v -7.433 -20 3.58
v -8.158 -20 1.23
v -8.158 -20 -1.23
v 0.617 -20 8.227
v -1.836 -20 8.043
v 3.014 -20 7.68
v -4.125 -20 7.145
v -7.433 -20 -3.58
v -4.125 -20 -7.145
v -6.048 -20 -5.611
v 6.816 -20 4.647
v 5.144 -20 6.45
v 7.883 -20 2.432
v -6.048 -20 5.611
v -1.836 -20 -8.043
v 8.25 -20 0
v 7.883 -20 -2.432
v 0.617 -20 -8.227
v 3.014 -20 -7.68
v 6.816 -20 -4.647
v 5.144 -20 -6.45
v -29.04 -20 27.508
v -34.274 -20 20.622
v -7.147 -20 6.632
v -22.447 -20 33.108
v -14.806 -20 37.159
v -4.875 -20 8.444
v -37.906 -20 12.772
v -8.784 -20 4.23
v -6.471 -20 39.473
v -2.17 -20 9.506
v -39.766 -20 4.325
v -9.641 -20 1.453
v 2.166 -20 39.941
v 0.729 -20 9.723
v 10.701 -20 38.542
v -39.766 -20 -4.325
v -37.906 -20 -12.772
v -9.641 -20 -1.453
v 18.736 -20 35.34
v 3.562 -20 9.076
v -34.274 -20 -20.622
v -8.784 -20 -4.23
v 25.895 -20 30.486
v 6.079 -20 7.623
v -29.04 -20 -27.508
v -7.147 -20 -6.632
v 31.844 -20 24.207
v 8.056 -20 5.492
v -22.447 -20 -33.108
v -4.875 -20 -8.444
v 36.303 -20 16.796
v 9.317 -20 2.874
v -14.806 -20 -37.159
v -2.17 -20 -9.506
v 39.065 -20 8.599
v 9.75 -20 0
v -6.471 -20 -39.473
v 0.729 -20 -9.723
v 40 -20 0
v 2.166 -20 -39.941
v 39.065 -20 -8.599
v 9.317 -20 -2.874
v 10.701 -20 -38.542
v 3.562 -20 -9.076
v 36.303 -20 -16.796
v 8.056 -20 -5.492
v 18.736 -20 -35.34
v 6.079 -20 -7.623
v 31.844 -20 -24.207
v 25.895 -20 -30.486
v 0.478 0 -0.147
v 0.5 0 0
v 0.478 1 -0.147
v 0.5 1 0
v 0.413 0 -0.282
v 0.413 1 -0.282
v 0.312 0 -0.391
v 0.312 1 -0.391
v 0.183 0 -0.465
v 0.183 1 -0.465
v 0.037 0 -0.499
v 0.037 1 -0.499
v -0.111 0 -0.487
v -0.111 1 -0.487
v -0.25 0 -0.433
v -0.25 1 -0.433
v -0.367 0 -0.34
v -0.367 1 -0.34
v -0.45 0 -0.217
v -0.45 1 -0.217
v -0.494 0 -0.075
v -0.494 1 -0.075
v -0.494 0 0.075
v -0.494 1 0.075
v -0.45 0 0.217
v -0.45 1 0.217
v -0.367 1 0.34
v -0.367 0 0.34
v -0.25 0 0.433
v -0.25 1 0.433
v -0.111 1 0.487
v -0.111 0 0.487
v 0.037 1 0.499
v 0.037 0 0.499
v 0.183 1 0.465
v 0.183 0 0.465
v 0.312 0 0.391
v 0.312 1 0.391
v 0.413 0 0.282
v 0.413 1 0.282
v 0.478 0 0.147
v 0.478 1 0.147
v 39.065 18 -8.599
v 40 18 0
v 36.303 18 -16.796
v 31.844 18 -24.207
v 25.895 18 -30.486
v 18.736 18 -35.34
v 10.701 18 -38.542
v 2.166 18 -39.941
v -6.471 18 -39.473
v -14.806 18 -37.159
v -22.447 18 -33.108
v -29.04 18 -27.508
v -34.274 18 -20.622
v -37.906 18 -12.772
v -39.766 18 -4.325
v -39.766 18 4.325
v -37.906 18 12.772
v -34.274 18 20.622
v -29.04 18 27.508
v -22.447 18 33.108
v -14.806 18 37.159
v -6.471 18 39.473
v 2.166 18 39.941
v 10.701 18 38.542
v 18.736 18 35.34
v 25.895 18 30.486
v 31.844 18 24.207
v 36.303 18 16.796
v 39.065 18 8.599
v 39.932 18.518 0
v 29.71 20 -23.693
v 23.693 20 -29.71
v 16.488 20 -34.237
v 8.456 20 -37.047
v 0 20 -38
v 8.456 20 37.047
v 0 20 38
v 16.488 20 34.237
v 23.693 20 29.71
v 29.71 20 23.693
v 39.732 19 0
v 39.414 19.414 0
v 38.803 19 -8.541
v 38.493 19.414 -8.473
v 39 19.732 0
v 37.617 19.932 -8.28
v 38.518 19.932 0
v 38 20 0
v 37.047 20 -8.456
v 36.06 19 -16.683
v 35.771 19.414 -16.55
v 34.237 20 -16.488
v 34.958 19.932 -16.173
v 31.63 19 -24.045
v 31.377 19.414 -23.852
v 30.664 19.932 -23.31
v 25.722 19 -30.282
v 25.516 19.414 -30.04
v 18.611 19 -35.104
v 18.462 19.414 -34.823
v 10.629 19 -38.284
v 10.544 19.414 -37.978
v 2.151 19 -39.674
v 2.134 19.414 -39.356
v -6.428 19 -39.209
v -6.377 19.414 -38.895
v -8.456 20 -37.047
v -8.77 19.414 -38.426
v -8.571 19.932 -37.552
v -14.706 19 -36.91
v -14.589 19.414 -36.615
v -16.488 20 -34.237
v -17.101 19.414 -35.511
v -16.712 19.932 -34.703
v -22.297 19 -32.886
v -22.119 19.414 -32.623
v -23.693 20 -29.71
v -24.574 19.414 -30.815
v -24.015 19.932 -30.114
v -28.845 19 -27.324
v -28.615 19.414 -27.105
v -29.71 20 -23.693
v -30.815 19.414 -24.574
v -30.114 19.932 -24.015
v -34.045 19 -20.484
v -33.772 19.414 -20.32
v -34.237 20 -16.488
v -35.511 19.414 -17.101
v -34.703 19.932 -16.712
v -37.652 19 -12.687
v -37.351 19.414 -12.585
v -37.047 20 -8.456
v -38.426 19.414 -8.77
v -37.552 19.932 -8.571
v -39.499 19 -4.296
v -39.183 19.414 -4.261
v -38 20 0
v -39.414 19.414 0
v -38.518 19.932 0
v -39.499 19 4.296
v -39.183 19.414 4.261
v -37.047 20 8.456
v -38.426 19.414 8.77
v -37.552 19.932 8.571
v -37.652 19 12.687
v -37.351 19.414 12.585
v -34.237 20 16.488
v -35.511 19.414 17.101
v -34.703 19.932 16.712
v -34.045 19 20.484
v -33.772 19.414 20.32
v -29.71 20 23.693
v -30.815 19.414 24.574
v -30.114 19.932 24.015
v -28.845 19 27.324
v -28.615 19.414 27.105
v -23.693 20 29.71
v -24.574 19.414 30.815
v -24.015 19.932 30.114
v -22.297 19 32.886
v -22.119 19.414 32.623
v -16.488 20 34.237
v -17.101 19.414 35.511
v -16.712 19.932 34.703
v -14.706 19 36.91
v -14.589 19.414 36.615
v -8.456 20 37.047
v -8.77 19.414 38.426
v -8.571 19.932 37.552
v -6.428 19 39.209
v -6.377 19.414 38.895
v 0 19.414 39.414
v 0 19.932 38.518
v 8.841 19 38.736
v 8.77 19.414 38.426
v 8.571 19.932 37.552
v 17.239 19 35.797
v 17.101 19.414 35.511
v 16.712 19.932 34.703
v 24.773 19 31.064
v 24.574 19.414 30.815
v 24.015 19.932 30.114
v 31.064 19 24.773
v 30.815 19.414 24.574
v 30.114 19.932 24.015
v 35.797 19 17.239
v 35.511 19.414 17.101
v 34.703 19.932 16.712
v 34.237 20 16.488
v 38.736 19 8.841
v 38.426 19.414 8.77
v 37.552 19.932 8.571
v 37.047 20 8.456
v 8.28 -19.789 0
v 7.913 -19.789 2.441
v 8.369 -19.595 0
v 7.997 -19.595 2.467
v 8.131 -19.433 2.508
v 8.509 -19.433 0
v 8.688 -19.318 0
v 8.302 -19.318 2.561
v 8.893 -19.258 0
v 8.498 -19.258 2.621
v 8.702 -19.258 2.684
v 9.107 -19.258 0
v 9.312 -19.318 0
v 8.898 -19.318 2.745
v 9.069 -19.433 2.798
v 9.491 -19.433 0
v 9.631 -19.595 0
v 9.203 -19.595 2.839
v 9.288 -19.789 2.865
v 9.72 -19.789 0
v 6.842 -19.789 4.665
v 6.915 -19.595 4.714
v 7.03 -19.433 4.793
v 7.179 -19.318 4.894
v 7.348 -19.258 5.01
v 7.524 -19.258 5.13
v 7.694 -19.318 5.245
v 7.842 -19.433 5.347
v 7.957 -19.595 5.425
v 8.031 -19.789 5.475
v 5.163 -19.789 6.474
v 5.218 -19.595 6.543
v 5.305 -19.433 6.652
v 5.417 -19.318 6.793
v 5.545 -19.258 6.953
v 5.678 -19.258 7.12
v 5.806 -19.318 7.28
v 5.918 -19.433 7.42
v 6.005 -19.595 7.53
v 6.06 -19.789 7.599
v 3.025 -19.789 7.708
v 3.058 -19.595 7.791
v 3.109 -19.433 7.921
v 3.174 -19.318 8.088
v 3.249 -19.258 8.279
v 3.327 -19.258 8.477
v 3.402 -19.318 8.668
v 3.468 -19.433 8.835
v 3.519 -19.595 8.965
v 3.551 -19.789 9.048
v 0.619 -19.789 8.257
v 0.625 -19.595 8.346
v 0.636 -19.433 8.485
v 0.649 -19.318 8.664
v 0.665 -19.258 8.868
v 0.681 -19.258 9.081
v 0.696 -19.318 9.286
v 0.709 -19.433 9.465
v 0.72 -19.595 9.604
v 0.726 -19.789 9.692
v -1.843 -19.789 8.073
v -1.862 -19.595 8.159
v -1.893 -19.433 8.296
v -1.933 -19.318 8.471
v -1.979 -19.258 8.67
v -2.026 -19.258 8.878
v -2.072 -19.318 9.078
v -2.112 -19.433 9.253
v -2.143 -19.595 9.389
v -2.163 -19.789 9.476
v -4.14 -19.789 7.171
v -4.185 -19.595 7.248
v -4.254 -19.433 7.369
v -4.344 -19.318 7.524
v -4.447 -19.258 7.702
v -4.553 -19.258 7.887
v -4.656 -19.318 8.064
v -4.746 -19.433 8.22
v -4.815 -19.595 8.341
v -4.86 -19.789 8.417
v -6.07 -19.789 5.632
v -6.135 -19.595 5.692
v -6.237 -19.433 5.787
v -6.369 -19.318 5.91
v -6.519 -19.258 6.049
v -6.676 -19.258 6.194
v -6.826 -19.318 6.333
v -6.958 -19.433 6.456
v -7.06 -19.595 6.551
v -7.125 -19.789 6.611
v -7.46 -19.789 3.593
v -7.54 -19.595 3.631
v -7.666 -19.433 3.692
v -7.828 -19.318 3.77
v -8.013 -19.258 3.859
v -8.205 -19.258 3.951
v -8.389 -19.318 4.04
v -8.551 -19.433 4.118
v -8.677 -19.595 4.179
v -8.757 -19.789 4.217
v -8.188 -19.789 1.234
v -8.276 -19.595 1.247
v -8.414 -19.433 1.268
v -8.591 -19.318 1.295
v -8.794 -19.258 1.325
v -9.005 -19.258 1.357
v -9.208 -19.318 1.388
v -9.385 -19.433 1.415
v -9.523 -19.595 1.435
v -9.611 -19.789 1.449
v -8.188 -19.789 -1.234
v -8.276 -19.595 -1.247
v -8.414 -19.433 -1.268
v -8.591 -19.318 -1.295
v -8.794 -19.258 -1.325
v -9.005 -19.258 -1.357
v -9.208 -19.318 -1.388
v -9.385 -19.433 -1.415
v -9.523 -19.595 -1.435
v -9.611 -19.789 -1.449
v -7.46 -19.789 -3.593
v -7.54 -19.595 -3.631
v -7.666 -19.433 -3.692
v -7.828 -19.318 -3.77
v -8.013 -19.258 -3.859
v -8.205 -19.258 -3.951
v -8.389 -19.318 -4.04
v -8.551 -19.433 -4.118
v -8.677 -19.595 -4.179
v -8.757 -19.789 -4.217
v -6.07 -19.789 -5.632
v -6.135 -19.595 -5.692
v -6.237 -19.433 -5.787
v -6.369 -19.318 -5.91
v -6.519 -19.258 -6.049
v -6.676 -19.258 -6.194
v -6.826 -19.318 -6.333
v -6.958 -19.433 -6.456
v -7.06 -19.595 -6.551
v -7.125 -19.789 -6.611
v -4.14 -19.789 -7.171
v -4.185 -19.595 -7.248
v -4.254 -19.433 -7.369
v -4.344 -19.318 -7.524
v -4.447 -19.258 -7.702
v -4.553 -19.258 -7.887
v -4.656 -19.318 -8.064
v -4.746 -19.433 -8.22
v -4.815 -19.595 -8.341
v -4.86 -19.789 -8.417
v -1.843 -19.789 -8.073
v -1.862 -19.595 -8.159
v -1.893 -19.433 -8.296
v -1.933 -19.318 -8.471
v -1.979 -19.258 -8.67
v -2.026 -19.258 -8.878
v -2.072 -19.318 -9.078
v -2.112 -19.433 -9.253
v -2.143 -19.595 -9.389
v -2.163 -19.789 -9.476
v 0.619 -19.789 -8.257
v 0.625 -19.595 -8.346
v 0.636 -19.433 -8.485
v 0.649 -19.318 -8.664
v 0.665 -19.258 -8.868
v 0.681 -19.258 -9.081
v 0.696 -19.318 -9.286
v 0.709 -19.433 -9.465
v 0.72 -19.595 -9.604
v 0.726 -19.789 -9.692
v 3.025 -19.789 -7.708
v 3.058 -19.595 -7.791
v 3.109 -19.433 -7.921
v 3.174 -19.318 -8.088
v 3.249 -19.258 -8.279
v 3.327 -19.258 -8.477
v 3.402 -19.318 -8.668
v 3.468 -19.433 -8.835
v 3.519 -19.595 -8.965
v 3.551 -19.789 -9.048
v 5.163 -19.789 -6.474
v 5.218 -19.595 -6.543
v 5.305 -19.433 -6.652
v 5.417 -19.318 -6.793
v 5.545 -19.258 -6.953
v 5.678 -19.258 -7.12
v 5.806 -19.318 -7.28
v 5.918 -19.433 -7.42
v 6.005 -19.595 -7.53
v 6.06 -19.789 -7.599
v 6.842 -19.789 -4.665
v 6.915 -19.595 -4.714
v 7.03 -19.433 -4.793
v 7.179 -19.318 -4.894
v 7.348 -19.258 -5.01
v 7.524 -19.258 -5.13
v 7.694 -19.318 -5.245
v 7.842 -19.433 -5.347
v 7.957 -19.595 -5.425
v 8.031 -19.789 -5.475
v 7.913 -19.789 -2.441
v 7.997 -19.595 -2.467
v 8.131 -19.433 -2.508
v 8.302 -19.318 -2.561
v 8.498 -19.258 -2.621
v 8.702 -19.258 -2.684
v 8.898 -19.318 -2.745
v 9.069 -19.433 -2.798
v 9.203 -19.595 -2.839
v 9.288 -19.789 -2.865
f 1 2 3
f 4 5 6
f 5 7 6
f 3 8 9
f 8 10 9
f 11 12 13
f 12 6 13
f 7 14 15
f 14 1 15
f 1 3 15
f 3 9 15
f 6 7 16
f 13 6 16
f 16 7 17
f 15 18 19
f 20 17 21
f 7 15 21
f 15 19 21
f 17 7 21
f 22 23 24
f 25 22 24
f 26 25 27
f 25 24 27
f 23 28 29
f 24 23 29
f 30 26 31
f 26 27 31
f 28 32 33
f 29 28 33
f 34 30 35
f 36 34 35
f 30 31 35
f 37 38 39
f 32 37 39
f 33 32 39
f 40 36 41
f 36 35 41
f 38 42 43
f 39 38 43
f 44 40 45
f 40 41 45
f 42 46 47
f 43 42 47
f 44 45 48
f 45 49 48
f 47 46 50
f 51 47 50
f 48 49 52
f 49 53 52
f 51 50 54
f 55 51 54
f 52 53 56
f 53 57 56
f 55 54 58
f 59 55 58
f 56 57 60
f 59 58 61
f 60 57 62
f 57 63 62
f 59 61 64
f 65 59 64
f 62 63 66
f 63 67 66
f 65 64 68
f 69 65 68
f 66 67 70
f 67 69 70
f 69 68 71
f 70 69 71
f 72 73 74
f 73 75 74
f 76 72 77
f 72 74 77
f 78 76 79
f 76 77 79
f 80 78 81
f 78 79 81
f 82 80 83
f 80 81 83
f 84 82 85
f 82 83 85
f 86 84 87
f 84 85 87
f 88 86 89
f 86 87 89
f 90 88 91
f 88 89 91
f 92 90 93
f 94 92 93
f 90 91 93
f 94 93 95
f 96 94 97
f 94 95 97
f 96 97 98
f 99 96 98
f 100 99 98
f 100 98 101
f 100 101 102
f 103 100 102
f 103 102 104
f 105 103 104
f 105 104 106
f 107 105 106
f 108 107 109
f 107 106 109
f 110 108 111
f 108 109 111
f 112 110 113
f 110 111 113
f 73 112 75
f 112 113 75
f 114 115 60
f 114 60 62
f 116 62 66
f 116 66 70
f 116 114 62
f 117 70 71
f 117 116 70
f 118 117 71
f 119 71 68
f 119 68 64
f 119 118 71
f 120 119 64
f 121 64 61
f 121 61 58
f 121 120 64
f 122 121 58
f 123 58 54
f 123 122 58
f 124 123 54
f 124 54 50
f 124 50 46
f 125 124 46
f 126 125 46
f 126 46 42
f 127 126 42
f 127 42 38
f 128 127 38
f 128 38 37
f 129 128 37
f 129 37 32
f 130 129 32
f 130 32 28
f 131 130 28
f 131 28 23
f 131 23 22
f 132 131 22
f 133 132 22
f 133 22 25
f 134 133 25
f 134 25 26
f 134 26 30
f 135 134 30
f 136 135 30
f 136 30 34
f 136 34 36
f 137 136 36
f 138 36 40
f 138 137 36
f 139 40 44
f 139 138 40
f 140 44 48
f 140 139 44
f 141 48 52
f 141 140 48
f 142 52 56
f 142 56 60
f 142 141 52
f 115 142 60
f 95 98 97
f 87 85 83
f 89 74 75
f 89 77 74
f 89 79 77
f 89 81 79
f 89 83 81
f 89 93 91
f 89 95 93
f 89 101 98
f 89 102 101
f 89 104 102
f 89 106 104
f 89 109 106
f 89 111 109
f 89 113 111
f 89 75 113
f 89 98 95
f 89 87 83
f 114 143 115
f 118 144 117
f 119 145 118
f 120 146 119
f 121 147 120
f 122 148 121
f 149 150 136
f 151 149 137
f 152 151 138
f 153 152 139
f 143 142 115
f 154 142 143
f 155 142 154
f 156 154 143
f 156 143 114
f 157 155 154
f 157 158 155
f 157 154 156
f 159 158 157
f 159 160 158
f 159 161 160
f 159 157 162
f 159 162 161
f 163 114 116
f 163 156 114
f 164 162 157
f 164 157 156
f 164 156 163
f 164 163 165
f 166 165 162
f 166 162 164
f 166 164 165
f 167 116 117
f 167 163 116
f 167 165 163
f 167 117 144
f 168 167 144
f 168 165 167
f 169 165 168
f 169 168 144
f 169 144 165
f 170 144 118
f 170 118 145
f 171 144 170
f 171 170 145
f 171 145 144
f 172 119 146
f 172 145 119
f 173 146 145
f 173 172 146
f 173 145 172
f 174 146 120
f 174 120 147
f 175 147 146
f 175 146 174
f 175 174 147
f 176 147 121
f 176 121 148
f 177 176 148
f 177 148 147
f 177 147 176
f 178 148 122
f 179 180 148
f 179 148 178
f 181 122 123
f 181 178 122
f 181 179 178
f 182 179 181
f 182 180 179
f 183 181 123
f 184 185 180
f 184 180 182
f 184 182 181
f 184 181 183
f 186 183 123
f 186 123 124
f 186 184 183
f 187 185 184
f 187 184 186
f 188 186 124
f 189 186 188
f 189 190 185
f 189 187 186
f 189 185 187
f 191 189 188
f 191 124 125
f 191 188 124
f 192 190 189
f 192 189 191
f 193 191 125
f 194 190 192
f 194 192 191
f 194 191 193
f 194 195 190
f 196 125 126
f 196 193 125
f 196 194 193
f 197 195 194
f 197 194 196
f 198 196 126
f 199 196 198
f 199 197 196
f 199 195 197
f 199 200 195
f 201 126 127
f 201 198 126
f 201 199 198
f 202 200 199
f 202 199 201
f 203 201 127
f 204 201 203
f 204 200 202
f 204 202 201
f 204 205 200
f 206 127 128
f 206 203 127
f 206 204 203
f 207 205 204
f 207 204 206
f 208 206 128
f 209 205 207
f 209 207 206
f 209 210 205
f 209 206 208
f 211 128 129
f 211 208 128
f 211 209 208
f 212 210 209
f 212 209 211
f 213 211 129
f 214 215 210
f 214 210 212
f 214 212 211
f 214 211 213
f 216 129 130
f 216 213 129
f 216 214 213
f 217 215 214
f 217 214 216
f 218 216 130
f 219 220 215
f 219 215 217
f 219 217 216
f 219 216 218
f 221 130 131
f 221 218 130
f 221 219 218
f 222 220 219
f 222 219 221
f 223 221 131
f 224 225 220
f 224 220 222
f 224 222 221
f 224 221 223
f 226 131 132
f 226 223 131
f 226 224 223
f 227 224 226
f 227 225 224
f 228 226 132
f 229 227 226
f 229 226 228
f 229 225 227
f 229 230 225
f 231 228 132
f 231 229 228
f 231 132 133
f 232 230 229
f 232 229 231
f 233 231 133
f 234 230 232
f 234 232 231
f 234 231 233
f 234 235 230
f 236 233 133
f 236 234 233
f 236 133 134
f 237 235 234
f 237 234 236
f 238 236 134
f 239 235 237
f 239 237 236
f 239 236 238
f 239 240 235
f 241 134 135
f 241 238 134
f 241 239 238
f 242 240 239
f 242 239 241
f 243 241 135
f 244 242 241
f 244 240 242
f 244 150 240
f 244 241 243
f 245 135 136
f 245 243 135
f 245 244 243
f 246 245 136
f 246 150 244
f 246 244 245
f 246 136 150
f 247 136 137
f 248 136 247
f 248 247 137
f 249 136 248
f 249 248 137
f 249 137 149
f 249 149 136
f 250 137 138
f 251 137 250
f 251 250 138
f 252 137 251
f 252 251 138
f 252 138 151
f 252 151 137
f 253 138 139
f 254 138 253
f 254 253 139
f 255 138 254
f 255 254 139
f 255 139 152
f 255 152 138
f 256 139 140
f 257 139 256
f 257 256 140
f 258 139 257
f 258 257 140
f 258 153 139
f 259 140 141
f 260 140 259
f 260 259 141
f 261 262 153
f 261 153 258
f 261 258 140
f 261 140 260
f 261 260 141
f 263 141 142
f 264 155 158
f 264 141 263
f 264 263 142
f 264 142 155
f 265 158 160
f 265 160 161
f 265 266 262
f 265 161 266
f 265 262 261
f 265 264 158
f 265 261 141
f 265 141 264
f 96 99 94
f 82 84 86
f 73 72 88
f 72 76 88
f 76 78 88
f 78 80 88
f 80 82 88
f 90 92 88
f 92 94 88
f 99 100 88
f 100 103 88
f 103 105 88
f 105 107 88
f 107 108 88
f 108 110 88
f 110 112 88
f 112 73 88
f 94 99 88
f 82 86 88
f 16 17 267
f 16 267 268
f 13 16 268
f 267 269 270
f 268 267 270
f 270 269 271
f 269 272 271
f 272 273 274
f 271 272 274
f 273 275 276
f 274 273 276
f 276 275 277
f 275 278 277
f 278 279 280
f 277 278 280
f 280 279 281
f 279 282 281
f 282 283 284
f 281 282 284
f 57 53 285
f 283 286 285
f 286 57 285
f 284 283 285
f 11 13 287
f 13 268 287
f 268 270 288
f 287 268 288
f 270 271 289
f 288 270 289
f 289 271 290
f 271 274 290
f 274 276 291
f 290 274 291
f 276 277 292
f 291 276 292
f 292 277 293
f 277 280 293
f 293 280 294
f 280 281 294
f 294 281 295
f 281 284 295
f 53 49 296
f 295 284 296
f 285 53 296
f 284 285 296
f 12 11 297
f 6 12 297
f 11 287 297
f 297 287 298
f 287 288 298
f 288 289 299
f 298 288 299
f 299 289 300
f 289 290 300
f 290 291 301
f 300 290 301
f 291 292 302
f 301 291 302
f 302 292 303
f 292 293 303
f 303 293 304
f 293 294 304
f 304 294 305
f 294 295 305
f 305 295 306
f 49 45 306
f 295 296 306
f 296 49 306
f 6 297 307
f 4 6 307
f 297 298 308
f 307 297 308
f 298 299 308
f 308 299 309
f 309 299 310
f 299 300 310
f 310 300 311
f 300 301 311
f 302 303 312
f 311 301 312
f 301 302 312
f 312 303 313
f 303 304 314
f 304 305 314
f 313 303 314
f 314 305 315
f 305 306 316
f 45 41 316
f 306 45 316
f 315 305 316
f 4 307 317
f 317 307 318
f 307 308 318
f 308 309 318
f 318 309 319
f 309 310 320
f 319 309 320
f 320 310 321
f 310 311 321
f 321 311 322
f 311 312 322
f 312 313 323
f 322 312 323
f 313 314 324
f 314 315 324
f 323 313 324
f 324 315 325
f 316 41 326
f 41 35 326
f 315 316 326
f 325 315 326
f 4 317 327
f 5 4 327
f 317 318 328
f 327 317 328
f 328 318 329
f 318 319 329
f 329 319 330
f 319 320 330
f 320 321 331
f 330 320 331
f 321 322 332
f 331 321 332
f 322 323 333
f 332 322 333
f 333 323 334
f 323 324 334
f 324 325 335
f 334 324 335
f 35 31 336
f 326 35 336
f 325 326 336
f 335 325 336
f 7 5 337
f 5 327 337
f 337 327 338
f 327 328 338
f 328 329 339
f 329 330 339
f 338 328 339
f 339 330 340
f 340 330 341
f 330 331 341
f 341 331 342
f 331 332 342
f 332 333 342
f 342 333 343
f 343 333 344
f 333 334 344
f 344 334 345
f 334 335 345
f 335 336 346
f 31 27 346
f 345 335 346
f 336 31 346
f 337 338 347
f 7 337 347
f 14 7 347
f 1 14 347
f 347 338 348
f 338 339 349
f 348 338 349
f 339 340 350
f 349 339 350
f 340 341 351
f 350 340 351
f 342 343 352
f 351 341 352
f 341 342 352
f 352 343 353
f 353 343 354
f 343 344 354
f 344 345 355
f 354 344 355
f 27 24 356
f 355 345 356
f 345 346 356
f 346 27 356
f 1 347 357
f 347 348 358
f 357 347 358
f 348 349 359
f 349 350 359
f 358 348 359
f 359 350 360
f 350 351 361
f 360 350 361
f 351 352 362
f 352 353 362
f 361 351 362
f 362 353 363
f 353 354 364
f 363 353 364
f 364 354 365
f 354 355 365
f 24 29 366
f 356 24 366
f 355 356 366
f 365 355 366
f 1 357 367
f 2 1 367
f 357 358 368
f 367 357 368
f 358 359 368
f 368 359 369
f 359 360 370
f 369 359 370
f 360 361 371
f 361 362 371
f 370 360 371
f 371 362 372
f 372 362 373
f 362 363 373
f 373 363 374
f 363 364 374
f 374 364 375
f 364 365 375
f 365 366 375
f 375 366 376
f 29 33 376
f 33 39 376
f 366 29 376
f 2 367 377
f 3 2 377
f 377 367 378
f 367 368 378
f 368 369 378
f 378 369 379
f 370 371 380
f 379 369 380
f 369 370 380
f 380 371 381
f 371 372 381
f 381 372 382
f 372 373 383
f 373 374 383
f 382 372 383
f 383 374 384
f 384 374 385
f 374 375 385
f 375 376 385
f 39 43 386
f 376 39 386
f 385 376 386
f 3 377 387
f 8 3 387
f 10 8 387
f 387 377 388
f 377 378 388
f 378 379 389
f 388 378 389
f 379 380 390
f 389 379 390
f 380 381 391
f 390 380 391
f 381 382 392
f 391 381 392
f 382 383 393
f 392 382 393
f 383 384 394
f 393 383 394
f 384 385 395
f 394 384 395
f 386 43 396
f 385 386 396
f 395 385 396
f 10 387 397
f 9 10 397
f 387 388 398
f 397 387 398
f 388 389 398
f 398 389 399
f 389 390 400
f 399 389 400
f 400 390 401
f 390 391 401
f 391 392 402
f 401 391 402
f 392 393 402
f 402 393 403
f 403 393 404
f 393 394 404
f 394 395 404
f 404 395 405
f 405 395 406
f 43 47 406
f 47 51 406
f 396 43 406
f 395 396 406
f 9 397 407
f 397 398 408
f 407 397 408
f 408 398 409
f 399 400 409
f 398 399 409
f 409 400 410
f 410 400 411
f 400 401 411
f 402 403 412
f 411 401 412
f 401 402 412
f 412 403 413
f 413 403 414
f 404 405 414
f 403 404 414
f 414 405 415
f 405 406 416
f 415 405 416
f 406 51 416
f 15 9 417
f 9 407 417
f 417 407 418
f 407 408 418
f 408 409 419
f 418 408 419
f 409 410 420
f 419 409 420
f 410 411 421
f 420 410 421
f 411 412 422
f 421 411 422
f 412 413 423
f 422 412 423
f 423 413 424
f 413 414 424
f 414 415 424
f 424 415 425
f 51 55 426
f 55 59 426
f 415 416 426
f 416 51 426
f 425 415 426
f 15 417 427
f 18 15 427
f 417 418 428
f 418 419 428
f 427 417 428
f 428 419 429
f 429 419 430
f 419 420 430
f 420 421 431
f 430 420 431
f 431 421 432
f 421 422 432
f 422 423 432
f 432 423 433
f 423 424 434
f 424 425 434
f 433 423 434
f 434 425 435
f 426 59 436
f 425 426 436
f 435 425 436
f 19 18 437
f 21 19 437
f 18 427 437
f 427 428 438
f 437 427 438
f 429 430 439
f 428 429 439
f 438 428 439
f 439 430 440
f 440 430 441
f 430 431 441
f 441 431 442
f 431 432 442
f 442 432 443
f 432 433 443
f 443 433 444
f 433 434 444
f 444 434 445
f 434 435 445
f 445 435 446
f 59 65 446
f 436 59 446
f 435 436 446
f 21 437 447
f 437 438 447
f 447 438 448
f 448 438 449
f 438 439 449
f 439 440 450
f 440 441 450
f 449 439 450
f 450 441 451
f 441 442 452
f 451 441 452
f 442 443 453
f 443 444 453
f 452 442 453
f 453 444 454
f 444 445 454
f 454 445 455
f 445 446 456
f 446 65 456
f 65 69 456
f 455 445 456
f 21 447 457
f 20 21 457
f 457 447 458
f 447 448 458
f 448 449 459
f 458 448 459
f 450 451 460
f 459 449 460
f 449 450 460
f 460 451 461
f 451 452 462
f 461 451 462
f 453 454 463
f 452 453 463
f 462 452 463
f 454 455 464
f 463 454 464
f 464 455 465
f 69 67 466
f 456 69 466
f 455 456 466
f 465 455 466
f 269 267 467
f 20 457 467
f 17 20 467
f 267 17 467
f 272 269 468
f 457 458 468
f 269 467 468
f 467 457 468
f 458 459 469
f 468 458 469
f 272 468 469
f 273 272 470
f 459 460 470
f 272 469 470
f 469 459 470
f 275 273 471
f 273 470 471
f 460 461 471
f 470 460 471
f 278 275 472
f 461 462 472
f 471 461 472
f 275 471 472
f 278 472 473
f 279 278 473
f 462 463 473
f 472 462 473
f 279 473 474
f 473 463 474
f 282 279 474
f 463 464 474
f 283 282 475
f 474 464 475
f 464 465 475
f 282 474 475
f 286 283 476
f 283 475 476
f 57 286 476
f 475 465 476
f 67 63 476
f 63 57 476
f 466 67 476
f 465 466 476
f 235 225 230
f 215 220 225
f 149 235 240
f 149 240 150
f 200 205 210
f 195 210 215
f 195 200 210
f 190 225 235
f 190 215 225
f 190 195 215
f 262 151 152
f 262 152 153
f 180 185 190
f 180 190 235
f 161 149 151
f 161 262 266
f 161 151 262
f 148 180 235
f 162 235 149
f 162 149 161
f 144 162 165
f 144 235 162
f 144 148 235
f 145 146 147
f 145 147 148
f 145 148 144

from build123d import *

# Parameters (mm, degrees)
SKETCH_1_R        = 40
EXTRUDE_1_DEPTH   = 20
FILLET_1_R        = 2
SWEEP_3_PROFILE_R = 0.75
SKETCH_2_W        = 0.5
SKETCH_2_H        = 1


with BuildPart() as part:
    # 草图1 → 凸台-拉伸1 (new body, symmetric)
    with BuildSketch(Plane(origin=(0, 0, 0), x_dir=(1, 0, 0), z_dir=(0, 1, 0))):
        Circle(SKETCH_1_R)
    extrude(amount=EXTRUDE_1_DEPTH, both=True)

    # 圆角1
    fillet_1_edges = [part.edges().sort_by_distance(p)[0] for p in [
        (-40, 20, 0),
    ]]
    fillet(fillet_1_edges, radius=FILLET_1_R)

    # 切除-扫描3: sweep along a path in 草图3
    with BuildLine(Plane.XZ.offset(20)) as sweep_3_path:
        CenterArc((0, 0), 9, 0, 360)
    # 切除-扫描3 profile (on start of the path) → 切除-扫描3 (sweep, cut)
    with BuildSketch(Plane(origin=(9, -20, 0), x_dir=(1, 0, 0), z_dir=(0, 0, 1))):
        Circle(SWEEP_3_PROFILE_R)
    sweep(path=sweep_3_path.line, mode=Mode.SUBTRACT)

    # 草图2 → 切除-旋转1 (revolve, cut)
    with BuildSketch(Plane.XY):
        with Locations((0.25, 0.5)):
            Rectangle(SKETCH_2_W, SKETCH_2_H)
    revolve(axis=Axis((0, 0, 0), (0, 1, 0)), mode=Mode.SUBTRACT)


solid = part.part
